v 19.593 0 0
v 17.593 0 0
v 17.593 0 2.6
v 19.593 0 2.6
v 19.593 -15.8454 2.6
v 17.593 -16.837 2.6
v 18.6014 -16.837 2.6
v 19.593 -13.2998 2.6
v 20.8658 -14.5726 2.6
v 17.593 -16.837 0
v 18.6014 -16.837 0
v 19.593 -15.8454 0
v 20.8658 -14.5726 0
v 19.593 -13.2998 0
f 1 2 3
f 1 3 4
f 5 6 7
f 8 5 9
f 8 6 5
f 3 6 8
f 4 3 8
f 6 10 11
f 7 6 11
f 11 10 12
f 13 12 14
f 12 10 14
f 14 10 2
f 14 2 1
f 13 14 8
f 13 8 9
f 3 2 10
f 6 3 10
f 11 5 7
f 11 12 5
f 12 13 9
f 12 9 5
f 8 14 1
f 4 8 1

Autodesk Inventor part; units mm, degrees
ref_plane "YZ Plane" through (0, 0, 0) normal (1, 0, 0) x (0, 1, 0)
ref_plane "XZ Plane" through (0, 0, 0) normal (0, 1, 0) x (-1, 0, 0)
ref_plane "XY Plane" through (0, 0, 0) normal (0, 0, 1) x (1, 0, 0)
sketch "Sketch1" plane through (0, 0, 0) normal (0, 0, 1) x (1, 0, 0)
  line L0 (2, -10.465368) -> (4.697799, -10.465368) construction
  line L1 (0, 0) -> (50, 0)
  line L2 (50, 0) -> (50, -50)
  line L3 (50, -50) -> (0, -50)
  line L4 (0, -50) -> (0, 0)
  line L5 (2.4, -2.4) -> (47.6, -2.4)
  line L6 (47.6, -2.4) -> (47.6, -47.6)
  line L7 (47.6, -47.6) -> (2.4, -47.6)
  line L8 (2.4, -47.6) -> (2.4, -2.4)
  line L9 (2.4, -2.4) -> (47.6, -47.6) construction
  line L10 (47.6, -2.4) -> (2.4, -47.6) construction
  circle A0 centre (25, -25) radius 19.375
  circle A1 centre (25, -25) radius 14.5
  circle A2 centre (25, -25) radius 4.175
  circle A3 centre (31.679764, -18.320236) radius 2.65
  circle A4 centre (25, -15.553387) radius 2.65
  circle A5 centre (18.320236, -18.320236) radius 2.65
  circle A6 centre (15.553387, -25) radius 2.65
  circle A7 centre (18.320236, -31.679764) radius 2.65
  circle A8 centre (25, -34.446613) radius 2.65
  circle A9 centre (31.679764, -31.679764) radius 2.65
  circle A10 centre (34.446613, -25) radius 2.65
  line L11 (50, -25) -> (-10.932785, -25) construction
  line L12 (33.553597, -16.446403) -> (35.253048, -14.746952)
  line L13 (33.553597, -33.553597) -> (35.253048, -35.253048)
  arc A11 (16.446403, -16.446403) -> (16.447482, -33.554675) centre (24.992317, -25) ccw
  line L14 (16.446403, -16.446403) -> (14.746952, -14.746952)
  line L15 (16.447482, -33.554675) -> (14.746952, -35.253048)
  line L16 (3.4, -3.4) -> (46.6, -3.4)
  line L17 (46.6, -3.4) -> (46.6, -46.6)
  line L18 (46.6, -46.6) -> (3.4, -46.6)
  line L19 (3.4, -46.6) -> (3.4, -3.4)
  line L20 (46.6, -46.6) -> (43.6, -46.6)
  line L21 (43.6, -46.6) -> (43.6, -43.6)
  line L22 (43.6, -43.6) -> (46.6, -43.6)
  line L23 (46.6, -43.6) -> (46.6, -46.6)
  line L24 (43.6, -43.6) -> (38.700194, -43.6)
  line L25 (38.700194, -43.6) -> (38.700194, -38.700194)
  line L26 (38.700194, -38.700194) -> (43.6, -38.700194)
  line L27 (43.6, -38.700194) -> (43.6, -43.6)
  line L28 (43.6, -38.700194) -> (46.6, -38.700194)
  line L29 (46.6, -38.700194) -> (46.6, -35.700194)
  line L30 (46.6, -35.700194) -> (43.6, -35.700194)
  line L31 (43.6, -35.700194) -> (43.6, -38.700194)
  line L32 (46.6, -35.700194) -> (42.820879, -35.700194)
  line L33 (42.820879, -35.700194) -> (42.820879, -32.603085)
  line L34 (42.820879, -32.603085) -> (46.6, -32.603085)
  line L35 (46.6, -32.603085) -> (46.6, -35.700194)
  line L36 (38.700194, -43.6) -> (35.700194, -43.6)
  line L37 (35.700194, -43.6) -> (35.700194, -46.6)
  line L38 (35.700194, -46.6) -> (38.700194, -46.6)
  line L39 (38.700194, -46.6) -> (38.700194, -43.6)
  line L40 (35.700194, -46.6) -> (32.383701, -46.6)
  line L41 (32.383701, -46.6) -> (32.383701, -42.912889)
  line L42 (32.383701, -42.912889) -> (35.700194, -42.912889)
  line L43 (35.700194, -42.912889) -> (35.700194, -46.6)
  line L44 (23.5, -43.2) -> (26.5, -43.2)
  line L45 (26.5, -43.2) -> (26.5, -50)
  line L46 (26.5, -50) -> (23.5, -50)
  line L47 (23.5, -50) -> (23.5, -43.2)
  line L48 (23.5, -43.2) -> (26.5, -50) construction
  line L49 (26.5, -43.2) -> (23.5, -50) construction
  circle A12 centre (7.947368, -7.947368) radius 4.547368
  circle A13 centre (42.052632, -7.947368) radius 4.547368
  line L50 (2.4, -47.6) -> (2.4, -50)
  line L51 (47.6, -47.6) -> (47.6, -50)
  line L52 (22.407108, -14.233364) -> (20.194069, -16.446403)
  line L53 (25, 8.52179) -> (25, -70.2) construction
  line L54 (18.320236, -8.83287) -> (18.320236, -33.554675) construction
  line L55 (18.320236, -14.57257) -> (20.194069, -16.446403)
  line L56 (18.320236, -14.57257) -> (20.533275, -12.359531)
  line L57 (22.407108, -14.233364) -> (20.533275, -12.359531)
  line L58 (18.320236, -14.57257) -> (19.593028, -13.299778)
  line L59 (19.593028, -13.299778) -> (20.86582, -14.57257)
  line L60 (20.86582, -14.57257) -> (19.593028, -15.845362)
  line L61 (31.679764, -14.57257) -> (29.466725, -12.359531)
  line L62 (27.592892, -14.233364) -> (29.466725, -12.359531)
  line L63 (27.592892, -14.233364) -> (29.805931, -16.446403)
  line L64 (31.679764, -14.57257) -> (29.805931, -16.446403)
  line L65 (19.593028, 0) -> (17.593028, 0)
  line L66 (17.593028, 0) -> (17.593028, -16.836985)
  line L67 (17.593028, -16.836985) -> (19.593028, -16.836985)
  line L68 (19.593028, -16.836985) -> (19.593028, 0)
  line L69 (19.593028, -15.845362) -> (18.601406, -16.836985)
  point P0 (25, -46.6)
  point P1 (26.5, -44.316848)
  point P2 (26.5, -46.6)
  point P3 (42.052632, -3.4)
  point P4 (46.6, -7.947368)
  point P5 (3.4, -7.947368)
  point P6 (7.947368, -3.4)
  point P7 (26.5, -47.6)
  point P8 (23.5, -47.6)
  dimension "d12" = 5.3
  dimension "d5" = 50
  dimension "d6" = 50
  dimension "d7" = 45.2
  dimension "d8" = 45.2
  dimension "d9" = 38.75
  dimension "d10" = 29
  dimension "d11" = 8.35
  dimension "d13" = 360
  dimension "d14" = 2.4
  dimension "d15" = 2.4
  dimension "d16" = 1
  dimension "d17" = 1
  dimension "d18" = 1
  dimension "d19" = 3
  dimension "d20" = 3
  dimension "d21" = 3
  dimension "d22" = 3
  dimension "d23" = 3
  dimension "d24" = 3
  dimension "d25" = 3
  dimension "d26" = 1.8
  dimension "d27" = 2
extrude "Extrusion1" add sketch "Sketch1" along normal blind 2.6 contours L1 L68 L5 L66 | L5 L68 L16 L66 | L16 L68 A0 L66 | A0 L68 A1 L66 | A1 L68 L56 L55 L69 A5 L66 | A5 L69 L67 L66 | L68 L55 L56 | L59 L60 L68
properties part number "baseHook"
